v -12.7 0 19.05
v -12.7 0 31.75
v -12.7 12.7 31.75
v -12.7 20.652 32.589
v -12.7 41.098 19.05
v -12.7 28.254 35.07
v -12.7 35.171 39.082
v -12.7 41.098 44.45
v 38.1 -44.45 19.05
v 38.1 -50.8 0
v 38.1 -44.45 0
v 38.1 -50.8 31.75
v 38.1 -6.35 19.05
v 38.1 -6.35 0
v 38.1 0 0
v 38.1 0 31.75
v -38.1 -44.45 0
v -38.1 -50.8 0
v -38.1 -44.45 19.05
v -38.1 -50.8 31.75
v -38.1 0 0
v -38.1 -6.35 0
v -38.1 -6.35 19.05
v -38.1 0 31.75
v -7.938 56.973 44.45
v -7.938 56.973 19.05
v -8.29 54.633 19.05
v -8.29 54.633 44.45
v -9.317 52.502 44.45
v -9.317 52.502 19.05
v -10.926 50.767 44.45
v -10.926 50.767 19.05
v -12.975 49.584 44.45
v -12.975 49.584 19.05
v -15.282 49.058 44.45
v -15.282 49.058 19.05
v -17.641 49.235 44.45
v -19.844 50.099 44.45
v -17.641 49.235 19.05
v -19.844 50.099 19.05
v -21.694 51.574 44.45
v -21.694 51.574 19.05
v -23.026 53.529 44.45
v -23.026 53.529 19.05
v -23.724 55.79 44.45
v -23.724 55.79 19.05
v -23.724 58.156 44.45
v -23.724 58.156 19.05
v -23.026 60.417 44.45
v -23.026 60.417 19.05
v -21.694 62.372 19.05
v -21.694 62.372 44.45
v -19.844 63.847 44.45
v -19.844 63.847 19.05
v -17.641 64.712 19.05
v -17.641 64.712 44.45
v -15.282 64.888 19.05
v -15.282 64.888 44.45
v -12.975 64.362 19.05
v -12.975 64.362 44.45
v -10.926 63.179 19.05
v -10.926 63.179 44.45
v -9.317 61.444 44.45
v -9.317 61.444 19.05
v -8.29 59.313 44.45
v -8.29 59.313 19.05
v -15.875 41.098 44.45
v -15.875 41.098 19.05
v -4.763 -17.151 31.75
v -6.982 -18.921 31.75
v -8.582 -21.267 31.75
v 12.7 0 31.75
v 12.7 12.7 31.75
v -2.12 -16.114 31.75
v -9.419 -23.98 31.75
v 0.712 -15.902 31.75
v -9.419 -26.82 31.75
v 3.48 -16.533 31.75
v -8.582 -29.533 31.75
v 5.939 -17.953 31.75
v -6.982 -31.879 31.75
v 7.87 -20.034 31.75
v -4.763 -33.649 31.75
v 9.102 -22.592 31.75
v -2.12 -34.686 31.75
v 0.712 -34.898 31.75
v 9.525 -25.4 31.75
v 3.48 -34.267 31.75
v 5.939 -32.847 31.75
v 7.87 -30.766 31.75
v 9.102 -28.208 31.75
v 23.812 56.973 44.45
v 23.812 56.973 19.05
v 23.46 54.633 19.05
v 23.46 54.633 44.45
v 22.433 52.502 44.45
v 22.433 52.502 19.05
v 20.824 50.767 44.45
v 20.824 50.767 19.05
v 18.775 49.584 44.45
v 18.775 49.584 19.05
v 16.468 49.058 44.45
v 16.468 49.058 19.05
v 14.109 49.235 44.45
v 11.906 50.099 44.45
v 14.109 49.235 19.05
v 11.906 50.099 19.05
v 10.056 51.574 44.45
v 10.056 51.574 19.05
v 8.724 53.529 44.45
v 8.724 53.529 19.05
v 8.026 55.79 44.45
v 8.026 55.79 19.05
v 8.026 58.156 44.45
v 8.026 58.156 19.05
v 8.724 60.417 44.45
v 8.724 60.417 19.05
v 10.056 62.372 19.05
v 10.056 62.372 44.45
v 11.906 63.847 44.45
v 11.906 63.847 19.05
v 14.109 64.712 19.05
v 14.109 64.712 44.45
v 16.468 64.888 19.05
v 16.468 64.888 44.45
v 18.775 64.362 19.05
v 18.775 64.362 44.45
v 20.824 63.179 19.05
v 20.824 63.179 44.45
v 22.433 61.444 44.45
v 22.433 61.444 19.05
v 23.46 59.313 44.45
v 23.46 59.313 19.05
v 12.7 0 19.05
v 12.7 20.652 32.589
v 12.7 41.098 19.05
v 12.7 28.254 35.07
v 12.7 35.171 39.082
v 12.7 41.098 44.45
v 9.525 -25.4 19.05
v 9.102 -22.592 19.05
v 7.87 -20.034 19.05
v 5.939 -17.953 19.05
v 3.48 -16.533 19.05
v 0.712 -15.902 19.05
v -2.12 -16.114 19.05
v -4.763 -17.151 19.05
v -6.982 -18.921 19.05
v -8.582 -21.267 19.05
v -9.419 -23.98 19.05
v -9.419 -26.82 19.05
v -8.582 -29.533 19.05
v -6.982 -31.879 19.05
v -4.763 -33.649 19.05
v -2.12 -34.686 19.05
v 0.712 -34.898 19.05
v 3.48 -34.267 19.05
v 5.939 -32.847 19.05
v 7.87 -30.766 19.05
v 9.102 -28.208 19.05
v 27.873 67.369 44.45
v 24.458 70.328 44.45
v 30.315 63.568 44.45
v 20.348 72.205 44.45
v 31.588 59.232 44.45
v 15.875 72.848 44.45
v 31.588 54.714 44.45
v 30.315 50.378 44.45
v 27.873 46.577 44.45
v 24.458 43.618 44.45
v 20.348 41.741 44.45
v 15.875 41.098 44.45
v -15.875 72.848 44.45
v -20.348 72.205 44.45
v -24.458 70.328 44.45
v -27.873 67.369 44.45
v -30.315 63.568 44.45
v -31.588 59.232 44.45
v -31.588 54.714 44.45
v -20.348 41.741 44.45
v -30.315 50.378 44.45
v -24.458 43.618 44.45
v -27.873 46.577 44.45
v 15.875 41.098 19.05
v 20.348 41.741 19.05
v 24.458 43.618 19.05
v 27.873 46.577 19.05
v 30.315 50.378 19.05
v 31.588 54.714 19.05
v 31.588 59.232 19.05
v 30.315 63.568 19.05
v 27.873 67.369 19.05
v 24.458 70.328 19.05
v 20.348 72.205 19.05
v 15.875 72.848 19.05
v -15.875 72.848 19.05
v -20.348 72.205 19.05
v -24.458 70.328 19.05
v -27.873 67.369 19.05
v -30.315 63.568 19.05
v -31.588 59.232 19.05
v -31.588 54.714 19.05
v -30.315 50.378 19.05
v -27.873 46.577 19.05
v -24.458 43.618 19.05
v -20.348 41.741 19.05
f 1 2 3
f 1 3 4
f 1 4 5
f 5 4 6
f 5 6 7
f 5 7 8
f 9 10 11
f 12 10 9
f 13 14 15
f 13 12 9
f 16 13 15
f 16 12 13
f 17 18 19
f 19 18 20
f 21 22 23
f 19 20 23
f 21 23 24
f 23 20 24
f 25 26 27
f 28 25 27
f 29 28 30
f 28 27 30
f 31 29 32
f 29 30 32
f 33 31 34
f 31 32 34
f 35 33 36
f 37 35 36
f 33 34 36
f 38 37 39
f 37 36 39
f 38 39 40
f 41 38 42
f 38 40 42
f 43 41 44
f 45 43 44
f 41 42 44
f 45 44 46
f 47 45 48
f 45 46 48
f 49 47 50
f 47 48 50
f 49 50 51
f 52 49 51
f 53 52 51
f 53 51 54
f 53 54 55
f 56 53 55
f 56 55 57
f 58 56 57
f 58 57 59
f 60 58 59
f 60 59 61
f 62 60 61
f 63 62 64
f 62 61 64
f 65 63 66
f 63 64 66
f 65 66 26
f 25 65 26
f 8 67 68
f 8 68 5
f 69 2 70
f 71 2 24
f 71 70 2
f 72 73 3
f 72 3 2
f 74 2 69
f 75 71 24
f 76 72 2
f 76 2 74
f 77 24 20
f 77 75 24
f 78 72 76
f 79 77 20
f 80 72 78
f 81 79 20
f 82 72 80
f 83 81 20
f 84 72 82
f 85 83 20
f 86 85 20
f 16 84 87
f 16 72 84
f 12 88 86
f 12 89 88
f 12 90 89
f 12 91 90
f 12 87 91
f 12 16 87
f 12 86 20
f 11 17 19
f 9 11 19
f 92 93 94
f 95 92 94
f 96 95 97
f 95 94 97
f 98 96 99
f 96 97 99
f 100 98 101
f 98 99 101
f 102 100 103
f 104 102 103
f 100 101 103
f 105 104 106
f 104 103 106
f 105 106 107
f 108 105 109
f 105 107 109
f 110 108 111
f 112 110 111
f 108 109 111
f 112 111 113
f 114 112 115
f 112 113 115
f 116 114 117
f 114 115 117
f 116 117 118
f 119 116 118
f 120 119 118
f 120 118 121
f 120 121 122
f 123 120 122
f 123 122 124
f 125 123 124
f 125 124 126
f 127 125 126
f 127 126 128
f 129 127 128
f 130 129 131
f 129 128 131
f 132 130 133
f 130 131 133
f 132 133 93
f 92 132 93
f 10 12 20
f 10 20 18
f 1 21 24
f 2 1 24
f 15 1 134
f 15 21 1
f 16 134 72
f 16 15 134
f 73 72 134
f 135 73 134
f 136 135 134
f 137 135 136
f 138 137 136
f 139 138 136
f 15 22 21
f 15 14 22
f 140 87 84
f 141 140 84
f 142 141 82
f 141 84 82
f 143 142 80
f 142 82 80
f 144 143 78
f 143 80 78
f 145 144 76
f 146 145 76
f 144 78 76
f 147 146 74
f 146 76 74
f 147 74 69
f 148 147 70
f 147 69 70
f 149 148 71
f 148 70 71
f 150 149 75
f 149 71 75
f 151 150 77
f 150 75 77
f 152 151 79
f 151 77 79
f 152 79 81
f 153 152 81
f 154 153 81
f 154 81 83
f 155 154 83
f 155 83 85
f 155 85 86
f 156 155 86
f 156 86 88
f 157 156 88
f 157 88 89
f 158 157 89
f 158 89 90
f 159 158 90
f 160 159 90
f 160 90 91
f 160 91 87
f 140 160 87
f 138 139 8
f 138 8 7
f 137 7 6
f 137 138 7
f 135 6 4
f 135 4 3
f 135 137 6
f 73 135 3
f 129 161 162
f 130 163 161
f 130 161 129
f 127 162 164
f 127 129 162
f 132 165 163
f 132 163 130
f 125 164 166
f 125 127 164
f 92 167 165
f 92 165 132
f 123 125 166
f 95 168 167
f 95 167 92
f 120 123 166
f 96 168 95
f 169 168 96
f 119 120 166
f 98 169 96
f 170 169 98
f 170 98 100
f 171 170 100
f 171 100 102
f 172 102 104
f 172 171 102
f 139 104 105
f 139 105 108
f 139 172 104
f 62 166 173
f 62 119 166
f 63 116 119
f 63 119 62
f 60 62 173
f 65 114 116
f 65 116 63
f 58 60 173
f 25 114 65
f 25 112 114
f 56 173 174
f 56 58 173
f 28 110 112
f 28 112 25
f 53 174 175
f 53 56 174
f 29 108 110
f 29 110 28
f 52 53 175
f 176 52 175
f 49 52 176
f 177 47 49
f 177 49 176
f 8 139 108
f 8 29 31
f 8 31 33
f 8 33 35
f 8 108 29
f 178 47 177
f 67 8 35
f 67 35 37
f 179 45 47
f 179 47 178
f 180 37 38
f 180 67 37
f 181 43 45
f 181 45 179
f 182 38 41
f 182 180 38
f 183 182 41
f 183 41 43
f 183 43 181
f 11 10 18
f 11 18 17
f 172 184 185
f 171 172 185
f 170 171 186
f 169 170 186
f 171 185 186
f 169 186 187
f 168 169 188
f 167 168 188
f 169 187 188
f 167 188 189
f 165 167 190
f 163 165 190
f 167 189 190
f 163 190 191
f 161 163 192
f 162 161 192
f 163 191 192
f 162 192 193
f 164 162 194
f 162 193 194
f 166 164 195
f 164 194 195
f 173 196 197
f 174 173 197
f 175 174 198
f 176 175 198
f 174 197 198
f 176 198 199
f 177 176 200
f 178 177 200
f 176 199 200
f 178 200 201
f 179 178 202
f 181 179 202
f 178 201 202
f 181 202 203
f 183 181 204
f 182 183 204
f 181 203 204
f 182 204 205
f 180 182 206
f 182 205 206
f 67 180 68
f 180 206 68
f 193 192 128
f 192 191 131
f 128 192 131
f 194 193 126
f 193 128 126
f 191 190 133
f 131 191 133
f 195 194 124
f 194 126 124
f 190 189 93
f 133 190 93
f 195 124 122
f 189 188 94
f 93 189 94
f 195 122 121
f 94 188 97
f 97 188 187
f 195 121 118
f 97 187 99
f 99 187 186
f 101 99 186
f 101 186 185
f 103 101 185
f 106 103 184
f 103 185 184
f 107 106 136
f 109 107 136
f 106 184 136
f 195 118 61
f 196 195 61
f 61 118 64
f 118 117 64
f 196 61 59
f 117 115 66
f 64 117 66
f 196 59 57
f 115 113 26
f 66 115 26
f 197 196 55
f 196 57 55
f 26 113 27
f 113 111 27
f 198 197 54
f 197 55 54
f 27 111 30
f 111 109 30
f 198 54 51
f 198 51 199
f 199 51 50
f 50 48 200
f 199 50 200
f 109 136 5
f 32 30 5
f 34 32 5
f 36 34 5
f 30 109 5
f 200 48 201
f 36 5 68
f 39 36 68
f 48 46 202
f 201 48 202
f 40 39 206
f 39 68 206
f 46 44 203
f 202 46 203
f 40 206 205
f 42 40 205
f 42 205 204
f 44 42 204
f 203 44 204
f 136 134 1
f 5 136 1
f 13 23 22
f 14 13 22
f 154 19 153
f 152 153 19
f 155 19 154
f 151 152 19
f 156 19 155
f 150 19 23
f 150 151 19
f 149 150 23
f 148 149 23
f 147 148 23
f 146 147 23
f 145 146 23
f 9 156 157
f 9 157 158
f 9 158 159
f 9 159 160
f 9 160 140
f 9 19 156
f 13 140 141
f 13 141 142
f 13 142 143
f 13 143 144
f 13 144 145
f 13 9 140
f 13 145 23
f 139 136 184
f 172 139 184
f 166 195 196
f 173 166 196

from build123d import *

# Parameters (mm, degrees)
BOSS_EXTRUDE1_DEPTH     = 38.1
SKETCH2_R               = 9.525
CUT_EXTRUDE1_DEPTH      = 1
CUT_EXTRUDE1_DEPTH_BACK = 32.75
BOSS_EXTRUDE2_DEPTH     = 12.7
SKETCH4_R               = 7.9375
BOSS_EXTRUDE3_DEPTH     = 25.4


with BuildPart() as part:
    # Sketch1 → Boss-Extrude1 (new body, symmetric)
    with BuildSketch(Plane.YZ):
        Polygon((0, 0), (0, 31.75), (-50.8, 31.75), (-50.8, 0), (-44.45, 0), (-44.45, 19.05), (-6.35, 19.05), (-6.35, 0), align=None)
    extrude(amount=BOSS_EXTRUDE1_DEPTH, both=True)

    # Sketch2 → Cut-Extrude1 (cut, two sides)
    with BuildSketch(Plane.XY.offset(31.75)) as cut_extrude1_sk:
        with Locations((0, -25.4)):
            Circle(SKETCH2_R)
    extrude(amount=CUT_EXTRUDE1_DEPTH, mode=Mode.SUBTRACT)
    extrude(cut_extrude1_sk.sketch, amount=-CUT_EXTRUDE1_DEPTH_BACK, mode=Mode.SUBTRACT)

    # Sketch3 → Boss-Extrude2 (add, symmetric)
    with BuildSketch(Plane.YZ):
        with BuildLine():
            Line((0, 19.05), (41.098063314, 19.05))
            Line((41.098063314, 19.05), (41.098063314, 44.45))
            ThreePointArc((41.098063314, 44.45), (28.254259867, 35.069617598), (12.7, 31.75))
            Line((12.7, 31.75), (0, 31.75))
            Line((0, 31.75), (0, 19.05))
        make_face()
    extrude(amount=BOSS_EXTRUDE2_DEPTH, both=True)

    # Sketch4 → Boss-Extrude3 (add)
    with BuildSketch(Plane(origin=(0, 0, 19.05), x_dir=(1, 0, 0), z_dir=(0, 0, -1))):
        with BuildLine():
            Line((-15.875, -41.098063314), (15.875, -41.098063314))
            ThreePointArc((15.875, -41.098063314), (31.75, -56.973063314), (15.875, -72.848063314))
            Line((15.875, -72.848063314), (-15.875, -72.848063314))
            ThreePointArc((-15.875, -72.848063314), (-31.75, -56.973063314), (-15.875, -41.098063314))
        make_face()
        with Locations((15.875, -56.973063314)):
            Circle(SKETCH4_R, mode=Mode.SUBTRACT)
        with Locations((-15.875, -56.973063314)):
            Circle(SKETCH4_R, mode=Mode.SUBTRACT)
    extrude(amount=-BOSS_EXTRUDE3_DEPTH)


solid = part.part
